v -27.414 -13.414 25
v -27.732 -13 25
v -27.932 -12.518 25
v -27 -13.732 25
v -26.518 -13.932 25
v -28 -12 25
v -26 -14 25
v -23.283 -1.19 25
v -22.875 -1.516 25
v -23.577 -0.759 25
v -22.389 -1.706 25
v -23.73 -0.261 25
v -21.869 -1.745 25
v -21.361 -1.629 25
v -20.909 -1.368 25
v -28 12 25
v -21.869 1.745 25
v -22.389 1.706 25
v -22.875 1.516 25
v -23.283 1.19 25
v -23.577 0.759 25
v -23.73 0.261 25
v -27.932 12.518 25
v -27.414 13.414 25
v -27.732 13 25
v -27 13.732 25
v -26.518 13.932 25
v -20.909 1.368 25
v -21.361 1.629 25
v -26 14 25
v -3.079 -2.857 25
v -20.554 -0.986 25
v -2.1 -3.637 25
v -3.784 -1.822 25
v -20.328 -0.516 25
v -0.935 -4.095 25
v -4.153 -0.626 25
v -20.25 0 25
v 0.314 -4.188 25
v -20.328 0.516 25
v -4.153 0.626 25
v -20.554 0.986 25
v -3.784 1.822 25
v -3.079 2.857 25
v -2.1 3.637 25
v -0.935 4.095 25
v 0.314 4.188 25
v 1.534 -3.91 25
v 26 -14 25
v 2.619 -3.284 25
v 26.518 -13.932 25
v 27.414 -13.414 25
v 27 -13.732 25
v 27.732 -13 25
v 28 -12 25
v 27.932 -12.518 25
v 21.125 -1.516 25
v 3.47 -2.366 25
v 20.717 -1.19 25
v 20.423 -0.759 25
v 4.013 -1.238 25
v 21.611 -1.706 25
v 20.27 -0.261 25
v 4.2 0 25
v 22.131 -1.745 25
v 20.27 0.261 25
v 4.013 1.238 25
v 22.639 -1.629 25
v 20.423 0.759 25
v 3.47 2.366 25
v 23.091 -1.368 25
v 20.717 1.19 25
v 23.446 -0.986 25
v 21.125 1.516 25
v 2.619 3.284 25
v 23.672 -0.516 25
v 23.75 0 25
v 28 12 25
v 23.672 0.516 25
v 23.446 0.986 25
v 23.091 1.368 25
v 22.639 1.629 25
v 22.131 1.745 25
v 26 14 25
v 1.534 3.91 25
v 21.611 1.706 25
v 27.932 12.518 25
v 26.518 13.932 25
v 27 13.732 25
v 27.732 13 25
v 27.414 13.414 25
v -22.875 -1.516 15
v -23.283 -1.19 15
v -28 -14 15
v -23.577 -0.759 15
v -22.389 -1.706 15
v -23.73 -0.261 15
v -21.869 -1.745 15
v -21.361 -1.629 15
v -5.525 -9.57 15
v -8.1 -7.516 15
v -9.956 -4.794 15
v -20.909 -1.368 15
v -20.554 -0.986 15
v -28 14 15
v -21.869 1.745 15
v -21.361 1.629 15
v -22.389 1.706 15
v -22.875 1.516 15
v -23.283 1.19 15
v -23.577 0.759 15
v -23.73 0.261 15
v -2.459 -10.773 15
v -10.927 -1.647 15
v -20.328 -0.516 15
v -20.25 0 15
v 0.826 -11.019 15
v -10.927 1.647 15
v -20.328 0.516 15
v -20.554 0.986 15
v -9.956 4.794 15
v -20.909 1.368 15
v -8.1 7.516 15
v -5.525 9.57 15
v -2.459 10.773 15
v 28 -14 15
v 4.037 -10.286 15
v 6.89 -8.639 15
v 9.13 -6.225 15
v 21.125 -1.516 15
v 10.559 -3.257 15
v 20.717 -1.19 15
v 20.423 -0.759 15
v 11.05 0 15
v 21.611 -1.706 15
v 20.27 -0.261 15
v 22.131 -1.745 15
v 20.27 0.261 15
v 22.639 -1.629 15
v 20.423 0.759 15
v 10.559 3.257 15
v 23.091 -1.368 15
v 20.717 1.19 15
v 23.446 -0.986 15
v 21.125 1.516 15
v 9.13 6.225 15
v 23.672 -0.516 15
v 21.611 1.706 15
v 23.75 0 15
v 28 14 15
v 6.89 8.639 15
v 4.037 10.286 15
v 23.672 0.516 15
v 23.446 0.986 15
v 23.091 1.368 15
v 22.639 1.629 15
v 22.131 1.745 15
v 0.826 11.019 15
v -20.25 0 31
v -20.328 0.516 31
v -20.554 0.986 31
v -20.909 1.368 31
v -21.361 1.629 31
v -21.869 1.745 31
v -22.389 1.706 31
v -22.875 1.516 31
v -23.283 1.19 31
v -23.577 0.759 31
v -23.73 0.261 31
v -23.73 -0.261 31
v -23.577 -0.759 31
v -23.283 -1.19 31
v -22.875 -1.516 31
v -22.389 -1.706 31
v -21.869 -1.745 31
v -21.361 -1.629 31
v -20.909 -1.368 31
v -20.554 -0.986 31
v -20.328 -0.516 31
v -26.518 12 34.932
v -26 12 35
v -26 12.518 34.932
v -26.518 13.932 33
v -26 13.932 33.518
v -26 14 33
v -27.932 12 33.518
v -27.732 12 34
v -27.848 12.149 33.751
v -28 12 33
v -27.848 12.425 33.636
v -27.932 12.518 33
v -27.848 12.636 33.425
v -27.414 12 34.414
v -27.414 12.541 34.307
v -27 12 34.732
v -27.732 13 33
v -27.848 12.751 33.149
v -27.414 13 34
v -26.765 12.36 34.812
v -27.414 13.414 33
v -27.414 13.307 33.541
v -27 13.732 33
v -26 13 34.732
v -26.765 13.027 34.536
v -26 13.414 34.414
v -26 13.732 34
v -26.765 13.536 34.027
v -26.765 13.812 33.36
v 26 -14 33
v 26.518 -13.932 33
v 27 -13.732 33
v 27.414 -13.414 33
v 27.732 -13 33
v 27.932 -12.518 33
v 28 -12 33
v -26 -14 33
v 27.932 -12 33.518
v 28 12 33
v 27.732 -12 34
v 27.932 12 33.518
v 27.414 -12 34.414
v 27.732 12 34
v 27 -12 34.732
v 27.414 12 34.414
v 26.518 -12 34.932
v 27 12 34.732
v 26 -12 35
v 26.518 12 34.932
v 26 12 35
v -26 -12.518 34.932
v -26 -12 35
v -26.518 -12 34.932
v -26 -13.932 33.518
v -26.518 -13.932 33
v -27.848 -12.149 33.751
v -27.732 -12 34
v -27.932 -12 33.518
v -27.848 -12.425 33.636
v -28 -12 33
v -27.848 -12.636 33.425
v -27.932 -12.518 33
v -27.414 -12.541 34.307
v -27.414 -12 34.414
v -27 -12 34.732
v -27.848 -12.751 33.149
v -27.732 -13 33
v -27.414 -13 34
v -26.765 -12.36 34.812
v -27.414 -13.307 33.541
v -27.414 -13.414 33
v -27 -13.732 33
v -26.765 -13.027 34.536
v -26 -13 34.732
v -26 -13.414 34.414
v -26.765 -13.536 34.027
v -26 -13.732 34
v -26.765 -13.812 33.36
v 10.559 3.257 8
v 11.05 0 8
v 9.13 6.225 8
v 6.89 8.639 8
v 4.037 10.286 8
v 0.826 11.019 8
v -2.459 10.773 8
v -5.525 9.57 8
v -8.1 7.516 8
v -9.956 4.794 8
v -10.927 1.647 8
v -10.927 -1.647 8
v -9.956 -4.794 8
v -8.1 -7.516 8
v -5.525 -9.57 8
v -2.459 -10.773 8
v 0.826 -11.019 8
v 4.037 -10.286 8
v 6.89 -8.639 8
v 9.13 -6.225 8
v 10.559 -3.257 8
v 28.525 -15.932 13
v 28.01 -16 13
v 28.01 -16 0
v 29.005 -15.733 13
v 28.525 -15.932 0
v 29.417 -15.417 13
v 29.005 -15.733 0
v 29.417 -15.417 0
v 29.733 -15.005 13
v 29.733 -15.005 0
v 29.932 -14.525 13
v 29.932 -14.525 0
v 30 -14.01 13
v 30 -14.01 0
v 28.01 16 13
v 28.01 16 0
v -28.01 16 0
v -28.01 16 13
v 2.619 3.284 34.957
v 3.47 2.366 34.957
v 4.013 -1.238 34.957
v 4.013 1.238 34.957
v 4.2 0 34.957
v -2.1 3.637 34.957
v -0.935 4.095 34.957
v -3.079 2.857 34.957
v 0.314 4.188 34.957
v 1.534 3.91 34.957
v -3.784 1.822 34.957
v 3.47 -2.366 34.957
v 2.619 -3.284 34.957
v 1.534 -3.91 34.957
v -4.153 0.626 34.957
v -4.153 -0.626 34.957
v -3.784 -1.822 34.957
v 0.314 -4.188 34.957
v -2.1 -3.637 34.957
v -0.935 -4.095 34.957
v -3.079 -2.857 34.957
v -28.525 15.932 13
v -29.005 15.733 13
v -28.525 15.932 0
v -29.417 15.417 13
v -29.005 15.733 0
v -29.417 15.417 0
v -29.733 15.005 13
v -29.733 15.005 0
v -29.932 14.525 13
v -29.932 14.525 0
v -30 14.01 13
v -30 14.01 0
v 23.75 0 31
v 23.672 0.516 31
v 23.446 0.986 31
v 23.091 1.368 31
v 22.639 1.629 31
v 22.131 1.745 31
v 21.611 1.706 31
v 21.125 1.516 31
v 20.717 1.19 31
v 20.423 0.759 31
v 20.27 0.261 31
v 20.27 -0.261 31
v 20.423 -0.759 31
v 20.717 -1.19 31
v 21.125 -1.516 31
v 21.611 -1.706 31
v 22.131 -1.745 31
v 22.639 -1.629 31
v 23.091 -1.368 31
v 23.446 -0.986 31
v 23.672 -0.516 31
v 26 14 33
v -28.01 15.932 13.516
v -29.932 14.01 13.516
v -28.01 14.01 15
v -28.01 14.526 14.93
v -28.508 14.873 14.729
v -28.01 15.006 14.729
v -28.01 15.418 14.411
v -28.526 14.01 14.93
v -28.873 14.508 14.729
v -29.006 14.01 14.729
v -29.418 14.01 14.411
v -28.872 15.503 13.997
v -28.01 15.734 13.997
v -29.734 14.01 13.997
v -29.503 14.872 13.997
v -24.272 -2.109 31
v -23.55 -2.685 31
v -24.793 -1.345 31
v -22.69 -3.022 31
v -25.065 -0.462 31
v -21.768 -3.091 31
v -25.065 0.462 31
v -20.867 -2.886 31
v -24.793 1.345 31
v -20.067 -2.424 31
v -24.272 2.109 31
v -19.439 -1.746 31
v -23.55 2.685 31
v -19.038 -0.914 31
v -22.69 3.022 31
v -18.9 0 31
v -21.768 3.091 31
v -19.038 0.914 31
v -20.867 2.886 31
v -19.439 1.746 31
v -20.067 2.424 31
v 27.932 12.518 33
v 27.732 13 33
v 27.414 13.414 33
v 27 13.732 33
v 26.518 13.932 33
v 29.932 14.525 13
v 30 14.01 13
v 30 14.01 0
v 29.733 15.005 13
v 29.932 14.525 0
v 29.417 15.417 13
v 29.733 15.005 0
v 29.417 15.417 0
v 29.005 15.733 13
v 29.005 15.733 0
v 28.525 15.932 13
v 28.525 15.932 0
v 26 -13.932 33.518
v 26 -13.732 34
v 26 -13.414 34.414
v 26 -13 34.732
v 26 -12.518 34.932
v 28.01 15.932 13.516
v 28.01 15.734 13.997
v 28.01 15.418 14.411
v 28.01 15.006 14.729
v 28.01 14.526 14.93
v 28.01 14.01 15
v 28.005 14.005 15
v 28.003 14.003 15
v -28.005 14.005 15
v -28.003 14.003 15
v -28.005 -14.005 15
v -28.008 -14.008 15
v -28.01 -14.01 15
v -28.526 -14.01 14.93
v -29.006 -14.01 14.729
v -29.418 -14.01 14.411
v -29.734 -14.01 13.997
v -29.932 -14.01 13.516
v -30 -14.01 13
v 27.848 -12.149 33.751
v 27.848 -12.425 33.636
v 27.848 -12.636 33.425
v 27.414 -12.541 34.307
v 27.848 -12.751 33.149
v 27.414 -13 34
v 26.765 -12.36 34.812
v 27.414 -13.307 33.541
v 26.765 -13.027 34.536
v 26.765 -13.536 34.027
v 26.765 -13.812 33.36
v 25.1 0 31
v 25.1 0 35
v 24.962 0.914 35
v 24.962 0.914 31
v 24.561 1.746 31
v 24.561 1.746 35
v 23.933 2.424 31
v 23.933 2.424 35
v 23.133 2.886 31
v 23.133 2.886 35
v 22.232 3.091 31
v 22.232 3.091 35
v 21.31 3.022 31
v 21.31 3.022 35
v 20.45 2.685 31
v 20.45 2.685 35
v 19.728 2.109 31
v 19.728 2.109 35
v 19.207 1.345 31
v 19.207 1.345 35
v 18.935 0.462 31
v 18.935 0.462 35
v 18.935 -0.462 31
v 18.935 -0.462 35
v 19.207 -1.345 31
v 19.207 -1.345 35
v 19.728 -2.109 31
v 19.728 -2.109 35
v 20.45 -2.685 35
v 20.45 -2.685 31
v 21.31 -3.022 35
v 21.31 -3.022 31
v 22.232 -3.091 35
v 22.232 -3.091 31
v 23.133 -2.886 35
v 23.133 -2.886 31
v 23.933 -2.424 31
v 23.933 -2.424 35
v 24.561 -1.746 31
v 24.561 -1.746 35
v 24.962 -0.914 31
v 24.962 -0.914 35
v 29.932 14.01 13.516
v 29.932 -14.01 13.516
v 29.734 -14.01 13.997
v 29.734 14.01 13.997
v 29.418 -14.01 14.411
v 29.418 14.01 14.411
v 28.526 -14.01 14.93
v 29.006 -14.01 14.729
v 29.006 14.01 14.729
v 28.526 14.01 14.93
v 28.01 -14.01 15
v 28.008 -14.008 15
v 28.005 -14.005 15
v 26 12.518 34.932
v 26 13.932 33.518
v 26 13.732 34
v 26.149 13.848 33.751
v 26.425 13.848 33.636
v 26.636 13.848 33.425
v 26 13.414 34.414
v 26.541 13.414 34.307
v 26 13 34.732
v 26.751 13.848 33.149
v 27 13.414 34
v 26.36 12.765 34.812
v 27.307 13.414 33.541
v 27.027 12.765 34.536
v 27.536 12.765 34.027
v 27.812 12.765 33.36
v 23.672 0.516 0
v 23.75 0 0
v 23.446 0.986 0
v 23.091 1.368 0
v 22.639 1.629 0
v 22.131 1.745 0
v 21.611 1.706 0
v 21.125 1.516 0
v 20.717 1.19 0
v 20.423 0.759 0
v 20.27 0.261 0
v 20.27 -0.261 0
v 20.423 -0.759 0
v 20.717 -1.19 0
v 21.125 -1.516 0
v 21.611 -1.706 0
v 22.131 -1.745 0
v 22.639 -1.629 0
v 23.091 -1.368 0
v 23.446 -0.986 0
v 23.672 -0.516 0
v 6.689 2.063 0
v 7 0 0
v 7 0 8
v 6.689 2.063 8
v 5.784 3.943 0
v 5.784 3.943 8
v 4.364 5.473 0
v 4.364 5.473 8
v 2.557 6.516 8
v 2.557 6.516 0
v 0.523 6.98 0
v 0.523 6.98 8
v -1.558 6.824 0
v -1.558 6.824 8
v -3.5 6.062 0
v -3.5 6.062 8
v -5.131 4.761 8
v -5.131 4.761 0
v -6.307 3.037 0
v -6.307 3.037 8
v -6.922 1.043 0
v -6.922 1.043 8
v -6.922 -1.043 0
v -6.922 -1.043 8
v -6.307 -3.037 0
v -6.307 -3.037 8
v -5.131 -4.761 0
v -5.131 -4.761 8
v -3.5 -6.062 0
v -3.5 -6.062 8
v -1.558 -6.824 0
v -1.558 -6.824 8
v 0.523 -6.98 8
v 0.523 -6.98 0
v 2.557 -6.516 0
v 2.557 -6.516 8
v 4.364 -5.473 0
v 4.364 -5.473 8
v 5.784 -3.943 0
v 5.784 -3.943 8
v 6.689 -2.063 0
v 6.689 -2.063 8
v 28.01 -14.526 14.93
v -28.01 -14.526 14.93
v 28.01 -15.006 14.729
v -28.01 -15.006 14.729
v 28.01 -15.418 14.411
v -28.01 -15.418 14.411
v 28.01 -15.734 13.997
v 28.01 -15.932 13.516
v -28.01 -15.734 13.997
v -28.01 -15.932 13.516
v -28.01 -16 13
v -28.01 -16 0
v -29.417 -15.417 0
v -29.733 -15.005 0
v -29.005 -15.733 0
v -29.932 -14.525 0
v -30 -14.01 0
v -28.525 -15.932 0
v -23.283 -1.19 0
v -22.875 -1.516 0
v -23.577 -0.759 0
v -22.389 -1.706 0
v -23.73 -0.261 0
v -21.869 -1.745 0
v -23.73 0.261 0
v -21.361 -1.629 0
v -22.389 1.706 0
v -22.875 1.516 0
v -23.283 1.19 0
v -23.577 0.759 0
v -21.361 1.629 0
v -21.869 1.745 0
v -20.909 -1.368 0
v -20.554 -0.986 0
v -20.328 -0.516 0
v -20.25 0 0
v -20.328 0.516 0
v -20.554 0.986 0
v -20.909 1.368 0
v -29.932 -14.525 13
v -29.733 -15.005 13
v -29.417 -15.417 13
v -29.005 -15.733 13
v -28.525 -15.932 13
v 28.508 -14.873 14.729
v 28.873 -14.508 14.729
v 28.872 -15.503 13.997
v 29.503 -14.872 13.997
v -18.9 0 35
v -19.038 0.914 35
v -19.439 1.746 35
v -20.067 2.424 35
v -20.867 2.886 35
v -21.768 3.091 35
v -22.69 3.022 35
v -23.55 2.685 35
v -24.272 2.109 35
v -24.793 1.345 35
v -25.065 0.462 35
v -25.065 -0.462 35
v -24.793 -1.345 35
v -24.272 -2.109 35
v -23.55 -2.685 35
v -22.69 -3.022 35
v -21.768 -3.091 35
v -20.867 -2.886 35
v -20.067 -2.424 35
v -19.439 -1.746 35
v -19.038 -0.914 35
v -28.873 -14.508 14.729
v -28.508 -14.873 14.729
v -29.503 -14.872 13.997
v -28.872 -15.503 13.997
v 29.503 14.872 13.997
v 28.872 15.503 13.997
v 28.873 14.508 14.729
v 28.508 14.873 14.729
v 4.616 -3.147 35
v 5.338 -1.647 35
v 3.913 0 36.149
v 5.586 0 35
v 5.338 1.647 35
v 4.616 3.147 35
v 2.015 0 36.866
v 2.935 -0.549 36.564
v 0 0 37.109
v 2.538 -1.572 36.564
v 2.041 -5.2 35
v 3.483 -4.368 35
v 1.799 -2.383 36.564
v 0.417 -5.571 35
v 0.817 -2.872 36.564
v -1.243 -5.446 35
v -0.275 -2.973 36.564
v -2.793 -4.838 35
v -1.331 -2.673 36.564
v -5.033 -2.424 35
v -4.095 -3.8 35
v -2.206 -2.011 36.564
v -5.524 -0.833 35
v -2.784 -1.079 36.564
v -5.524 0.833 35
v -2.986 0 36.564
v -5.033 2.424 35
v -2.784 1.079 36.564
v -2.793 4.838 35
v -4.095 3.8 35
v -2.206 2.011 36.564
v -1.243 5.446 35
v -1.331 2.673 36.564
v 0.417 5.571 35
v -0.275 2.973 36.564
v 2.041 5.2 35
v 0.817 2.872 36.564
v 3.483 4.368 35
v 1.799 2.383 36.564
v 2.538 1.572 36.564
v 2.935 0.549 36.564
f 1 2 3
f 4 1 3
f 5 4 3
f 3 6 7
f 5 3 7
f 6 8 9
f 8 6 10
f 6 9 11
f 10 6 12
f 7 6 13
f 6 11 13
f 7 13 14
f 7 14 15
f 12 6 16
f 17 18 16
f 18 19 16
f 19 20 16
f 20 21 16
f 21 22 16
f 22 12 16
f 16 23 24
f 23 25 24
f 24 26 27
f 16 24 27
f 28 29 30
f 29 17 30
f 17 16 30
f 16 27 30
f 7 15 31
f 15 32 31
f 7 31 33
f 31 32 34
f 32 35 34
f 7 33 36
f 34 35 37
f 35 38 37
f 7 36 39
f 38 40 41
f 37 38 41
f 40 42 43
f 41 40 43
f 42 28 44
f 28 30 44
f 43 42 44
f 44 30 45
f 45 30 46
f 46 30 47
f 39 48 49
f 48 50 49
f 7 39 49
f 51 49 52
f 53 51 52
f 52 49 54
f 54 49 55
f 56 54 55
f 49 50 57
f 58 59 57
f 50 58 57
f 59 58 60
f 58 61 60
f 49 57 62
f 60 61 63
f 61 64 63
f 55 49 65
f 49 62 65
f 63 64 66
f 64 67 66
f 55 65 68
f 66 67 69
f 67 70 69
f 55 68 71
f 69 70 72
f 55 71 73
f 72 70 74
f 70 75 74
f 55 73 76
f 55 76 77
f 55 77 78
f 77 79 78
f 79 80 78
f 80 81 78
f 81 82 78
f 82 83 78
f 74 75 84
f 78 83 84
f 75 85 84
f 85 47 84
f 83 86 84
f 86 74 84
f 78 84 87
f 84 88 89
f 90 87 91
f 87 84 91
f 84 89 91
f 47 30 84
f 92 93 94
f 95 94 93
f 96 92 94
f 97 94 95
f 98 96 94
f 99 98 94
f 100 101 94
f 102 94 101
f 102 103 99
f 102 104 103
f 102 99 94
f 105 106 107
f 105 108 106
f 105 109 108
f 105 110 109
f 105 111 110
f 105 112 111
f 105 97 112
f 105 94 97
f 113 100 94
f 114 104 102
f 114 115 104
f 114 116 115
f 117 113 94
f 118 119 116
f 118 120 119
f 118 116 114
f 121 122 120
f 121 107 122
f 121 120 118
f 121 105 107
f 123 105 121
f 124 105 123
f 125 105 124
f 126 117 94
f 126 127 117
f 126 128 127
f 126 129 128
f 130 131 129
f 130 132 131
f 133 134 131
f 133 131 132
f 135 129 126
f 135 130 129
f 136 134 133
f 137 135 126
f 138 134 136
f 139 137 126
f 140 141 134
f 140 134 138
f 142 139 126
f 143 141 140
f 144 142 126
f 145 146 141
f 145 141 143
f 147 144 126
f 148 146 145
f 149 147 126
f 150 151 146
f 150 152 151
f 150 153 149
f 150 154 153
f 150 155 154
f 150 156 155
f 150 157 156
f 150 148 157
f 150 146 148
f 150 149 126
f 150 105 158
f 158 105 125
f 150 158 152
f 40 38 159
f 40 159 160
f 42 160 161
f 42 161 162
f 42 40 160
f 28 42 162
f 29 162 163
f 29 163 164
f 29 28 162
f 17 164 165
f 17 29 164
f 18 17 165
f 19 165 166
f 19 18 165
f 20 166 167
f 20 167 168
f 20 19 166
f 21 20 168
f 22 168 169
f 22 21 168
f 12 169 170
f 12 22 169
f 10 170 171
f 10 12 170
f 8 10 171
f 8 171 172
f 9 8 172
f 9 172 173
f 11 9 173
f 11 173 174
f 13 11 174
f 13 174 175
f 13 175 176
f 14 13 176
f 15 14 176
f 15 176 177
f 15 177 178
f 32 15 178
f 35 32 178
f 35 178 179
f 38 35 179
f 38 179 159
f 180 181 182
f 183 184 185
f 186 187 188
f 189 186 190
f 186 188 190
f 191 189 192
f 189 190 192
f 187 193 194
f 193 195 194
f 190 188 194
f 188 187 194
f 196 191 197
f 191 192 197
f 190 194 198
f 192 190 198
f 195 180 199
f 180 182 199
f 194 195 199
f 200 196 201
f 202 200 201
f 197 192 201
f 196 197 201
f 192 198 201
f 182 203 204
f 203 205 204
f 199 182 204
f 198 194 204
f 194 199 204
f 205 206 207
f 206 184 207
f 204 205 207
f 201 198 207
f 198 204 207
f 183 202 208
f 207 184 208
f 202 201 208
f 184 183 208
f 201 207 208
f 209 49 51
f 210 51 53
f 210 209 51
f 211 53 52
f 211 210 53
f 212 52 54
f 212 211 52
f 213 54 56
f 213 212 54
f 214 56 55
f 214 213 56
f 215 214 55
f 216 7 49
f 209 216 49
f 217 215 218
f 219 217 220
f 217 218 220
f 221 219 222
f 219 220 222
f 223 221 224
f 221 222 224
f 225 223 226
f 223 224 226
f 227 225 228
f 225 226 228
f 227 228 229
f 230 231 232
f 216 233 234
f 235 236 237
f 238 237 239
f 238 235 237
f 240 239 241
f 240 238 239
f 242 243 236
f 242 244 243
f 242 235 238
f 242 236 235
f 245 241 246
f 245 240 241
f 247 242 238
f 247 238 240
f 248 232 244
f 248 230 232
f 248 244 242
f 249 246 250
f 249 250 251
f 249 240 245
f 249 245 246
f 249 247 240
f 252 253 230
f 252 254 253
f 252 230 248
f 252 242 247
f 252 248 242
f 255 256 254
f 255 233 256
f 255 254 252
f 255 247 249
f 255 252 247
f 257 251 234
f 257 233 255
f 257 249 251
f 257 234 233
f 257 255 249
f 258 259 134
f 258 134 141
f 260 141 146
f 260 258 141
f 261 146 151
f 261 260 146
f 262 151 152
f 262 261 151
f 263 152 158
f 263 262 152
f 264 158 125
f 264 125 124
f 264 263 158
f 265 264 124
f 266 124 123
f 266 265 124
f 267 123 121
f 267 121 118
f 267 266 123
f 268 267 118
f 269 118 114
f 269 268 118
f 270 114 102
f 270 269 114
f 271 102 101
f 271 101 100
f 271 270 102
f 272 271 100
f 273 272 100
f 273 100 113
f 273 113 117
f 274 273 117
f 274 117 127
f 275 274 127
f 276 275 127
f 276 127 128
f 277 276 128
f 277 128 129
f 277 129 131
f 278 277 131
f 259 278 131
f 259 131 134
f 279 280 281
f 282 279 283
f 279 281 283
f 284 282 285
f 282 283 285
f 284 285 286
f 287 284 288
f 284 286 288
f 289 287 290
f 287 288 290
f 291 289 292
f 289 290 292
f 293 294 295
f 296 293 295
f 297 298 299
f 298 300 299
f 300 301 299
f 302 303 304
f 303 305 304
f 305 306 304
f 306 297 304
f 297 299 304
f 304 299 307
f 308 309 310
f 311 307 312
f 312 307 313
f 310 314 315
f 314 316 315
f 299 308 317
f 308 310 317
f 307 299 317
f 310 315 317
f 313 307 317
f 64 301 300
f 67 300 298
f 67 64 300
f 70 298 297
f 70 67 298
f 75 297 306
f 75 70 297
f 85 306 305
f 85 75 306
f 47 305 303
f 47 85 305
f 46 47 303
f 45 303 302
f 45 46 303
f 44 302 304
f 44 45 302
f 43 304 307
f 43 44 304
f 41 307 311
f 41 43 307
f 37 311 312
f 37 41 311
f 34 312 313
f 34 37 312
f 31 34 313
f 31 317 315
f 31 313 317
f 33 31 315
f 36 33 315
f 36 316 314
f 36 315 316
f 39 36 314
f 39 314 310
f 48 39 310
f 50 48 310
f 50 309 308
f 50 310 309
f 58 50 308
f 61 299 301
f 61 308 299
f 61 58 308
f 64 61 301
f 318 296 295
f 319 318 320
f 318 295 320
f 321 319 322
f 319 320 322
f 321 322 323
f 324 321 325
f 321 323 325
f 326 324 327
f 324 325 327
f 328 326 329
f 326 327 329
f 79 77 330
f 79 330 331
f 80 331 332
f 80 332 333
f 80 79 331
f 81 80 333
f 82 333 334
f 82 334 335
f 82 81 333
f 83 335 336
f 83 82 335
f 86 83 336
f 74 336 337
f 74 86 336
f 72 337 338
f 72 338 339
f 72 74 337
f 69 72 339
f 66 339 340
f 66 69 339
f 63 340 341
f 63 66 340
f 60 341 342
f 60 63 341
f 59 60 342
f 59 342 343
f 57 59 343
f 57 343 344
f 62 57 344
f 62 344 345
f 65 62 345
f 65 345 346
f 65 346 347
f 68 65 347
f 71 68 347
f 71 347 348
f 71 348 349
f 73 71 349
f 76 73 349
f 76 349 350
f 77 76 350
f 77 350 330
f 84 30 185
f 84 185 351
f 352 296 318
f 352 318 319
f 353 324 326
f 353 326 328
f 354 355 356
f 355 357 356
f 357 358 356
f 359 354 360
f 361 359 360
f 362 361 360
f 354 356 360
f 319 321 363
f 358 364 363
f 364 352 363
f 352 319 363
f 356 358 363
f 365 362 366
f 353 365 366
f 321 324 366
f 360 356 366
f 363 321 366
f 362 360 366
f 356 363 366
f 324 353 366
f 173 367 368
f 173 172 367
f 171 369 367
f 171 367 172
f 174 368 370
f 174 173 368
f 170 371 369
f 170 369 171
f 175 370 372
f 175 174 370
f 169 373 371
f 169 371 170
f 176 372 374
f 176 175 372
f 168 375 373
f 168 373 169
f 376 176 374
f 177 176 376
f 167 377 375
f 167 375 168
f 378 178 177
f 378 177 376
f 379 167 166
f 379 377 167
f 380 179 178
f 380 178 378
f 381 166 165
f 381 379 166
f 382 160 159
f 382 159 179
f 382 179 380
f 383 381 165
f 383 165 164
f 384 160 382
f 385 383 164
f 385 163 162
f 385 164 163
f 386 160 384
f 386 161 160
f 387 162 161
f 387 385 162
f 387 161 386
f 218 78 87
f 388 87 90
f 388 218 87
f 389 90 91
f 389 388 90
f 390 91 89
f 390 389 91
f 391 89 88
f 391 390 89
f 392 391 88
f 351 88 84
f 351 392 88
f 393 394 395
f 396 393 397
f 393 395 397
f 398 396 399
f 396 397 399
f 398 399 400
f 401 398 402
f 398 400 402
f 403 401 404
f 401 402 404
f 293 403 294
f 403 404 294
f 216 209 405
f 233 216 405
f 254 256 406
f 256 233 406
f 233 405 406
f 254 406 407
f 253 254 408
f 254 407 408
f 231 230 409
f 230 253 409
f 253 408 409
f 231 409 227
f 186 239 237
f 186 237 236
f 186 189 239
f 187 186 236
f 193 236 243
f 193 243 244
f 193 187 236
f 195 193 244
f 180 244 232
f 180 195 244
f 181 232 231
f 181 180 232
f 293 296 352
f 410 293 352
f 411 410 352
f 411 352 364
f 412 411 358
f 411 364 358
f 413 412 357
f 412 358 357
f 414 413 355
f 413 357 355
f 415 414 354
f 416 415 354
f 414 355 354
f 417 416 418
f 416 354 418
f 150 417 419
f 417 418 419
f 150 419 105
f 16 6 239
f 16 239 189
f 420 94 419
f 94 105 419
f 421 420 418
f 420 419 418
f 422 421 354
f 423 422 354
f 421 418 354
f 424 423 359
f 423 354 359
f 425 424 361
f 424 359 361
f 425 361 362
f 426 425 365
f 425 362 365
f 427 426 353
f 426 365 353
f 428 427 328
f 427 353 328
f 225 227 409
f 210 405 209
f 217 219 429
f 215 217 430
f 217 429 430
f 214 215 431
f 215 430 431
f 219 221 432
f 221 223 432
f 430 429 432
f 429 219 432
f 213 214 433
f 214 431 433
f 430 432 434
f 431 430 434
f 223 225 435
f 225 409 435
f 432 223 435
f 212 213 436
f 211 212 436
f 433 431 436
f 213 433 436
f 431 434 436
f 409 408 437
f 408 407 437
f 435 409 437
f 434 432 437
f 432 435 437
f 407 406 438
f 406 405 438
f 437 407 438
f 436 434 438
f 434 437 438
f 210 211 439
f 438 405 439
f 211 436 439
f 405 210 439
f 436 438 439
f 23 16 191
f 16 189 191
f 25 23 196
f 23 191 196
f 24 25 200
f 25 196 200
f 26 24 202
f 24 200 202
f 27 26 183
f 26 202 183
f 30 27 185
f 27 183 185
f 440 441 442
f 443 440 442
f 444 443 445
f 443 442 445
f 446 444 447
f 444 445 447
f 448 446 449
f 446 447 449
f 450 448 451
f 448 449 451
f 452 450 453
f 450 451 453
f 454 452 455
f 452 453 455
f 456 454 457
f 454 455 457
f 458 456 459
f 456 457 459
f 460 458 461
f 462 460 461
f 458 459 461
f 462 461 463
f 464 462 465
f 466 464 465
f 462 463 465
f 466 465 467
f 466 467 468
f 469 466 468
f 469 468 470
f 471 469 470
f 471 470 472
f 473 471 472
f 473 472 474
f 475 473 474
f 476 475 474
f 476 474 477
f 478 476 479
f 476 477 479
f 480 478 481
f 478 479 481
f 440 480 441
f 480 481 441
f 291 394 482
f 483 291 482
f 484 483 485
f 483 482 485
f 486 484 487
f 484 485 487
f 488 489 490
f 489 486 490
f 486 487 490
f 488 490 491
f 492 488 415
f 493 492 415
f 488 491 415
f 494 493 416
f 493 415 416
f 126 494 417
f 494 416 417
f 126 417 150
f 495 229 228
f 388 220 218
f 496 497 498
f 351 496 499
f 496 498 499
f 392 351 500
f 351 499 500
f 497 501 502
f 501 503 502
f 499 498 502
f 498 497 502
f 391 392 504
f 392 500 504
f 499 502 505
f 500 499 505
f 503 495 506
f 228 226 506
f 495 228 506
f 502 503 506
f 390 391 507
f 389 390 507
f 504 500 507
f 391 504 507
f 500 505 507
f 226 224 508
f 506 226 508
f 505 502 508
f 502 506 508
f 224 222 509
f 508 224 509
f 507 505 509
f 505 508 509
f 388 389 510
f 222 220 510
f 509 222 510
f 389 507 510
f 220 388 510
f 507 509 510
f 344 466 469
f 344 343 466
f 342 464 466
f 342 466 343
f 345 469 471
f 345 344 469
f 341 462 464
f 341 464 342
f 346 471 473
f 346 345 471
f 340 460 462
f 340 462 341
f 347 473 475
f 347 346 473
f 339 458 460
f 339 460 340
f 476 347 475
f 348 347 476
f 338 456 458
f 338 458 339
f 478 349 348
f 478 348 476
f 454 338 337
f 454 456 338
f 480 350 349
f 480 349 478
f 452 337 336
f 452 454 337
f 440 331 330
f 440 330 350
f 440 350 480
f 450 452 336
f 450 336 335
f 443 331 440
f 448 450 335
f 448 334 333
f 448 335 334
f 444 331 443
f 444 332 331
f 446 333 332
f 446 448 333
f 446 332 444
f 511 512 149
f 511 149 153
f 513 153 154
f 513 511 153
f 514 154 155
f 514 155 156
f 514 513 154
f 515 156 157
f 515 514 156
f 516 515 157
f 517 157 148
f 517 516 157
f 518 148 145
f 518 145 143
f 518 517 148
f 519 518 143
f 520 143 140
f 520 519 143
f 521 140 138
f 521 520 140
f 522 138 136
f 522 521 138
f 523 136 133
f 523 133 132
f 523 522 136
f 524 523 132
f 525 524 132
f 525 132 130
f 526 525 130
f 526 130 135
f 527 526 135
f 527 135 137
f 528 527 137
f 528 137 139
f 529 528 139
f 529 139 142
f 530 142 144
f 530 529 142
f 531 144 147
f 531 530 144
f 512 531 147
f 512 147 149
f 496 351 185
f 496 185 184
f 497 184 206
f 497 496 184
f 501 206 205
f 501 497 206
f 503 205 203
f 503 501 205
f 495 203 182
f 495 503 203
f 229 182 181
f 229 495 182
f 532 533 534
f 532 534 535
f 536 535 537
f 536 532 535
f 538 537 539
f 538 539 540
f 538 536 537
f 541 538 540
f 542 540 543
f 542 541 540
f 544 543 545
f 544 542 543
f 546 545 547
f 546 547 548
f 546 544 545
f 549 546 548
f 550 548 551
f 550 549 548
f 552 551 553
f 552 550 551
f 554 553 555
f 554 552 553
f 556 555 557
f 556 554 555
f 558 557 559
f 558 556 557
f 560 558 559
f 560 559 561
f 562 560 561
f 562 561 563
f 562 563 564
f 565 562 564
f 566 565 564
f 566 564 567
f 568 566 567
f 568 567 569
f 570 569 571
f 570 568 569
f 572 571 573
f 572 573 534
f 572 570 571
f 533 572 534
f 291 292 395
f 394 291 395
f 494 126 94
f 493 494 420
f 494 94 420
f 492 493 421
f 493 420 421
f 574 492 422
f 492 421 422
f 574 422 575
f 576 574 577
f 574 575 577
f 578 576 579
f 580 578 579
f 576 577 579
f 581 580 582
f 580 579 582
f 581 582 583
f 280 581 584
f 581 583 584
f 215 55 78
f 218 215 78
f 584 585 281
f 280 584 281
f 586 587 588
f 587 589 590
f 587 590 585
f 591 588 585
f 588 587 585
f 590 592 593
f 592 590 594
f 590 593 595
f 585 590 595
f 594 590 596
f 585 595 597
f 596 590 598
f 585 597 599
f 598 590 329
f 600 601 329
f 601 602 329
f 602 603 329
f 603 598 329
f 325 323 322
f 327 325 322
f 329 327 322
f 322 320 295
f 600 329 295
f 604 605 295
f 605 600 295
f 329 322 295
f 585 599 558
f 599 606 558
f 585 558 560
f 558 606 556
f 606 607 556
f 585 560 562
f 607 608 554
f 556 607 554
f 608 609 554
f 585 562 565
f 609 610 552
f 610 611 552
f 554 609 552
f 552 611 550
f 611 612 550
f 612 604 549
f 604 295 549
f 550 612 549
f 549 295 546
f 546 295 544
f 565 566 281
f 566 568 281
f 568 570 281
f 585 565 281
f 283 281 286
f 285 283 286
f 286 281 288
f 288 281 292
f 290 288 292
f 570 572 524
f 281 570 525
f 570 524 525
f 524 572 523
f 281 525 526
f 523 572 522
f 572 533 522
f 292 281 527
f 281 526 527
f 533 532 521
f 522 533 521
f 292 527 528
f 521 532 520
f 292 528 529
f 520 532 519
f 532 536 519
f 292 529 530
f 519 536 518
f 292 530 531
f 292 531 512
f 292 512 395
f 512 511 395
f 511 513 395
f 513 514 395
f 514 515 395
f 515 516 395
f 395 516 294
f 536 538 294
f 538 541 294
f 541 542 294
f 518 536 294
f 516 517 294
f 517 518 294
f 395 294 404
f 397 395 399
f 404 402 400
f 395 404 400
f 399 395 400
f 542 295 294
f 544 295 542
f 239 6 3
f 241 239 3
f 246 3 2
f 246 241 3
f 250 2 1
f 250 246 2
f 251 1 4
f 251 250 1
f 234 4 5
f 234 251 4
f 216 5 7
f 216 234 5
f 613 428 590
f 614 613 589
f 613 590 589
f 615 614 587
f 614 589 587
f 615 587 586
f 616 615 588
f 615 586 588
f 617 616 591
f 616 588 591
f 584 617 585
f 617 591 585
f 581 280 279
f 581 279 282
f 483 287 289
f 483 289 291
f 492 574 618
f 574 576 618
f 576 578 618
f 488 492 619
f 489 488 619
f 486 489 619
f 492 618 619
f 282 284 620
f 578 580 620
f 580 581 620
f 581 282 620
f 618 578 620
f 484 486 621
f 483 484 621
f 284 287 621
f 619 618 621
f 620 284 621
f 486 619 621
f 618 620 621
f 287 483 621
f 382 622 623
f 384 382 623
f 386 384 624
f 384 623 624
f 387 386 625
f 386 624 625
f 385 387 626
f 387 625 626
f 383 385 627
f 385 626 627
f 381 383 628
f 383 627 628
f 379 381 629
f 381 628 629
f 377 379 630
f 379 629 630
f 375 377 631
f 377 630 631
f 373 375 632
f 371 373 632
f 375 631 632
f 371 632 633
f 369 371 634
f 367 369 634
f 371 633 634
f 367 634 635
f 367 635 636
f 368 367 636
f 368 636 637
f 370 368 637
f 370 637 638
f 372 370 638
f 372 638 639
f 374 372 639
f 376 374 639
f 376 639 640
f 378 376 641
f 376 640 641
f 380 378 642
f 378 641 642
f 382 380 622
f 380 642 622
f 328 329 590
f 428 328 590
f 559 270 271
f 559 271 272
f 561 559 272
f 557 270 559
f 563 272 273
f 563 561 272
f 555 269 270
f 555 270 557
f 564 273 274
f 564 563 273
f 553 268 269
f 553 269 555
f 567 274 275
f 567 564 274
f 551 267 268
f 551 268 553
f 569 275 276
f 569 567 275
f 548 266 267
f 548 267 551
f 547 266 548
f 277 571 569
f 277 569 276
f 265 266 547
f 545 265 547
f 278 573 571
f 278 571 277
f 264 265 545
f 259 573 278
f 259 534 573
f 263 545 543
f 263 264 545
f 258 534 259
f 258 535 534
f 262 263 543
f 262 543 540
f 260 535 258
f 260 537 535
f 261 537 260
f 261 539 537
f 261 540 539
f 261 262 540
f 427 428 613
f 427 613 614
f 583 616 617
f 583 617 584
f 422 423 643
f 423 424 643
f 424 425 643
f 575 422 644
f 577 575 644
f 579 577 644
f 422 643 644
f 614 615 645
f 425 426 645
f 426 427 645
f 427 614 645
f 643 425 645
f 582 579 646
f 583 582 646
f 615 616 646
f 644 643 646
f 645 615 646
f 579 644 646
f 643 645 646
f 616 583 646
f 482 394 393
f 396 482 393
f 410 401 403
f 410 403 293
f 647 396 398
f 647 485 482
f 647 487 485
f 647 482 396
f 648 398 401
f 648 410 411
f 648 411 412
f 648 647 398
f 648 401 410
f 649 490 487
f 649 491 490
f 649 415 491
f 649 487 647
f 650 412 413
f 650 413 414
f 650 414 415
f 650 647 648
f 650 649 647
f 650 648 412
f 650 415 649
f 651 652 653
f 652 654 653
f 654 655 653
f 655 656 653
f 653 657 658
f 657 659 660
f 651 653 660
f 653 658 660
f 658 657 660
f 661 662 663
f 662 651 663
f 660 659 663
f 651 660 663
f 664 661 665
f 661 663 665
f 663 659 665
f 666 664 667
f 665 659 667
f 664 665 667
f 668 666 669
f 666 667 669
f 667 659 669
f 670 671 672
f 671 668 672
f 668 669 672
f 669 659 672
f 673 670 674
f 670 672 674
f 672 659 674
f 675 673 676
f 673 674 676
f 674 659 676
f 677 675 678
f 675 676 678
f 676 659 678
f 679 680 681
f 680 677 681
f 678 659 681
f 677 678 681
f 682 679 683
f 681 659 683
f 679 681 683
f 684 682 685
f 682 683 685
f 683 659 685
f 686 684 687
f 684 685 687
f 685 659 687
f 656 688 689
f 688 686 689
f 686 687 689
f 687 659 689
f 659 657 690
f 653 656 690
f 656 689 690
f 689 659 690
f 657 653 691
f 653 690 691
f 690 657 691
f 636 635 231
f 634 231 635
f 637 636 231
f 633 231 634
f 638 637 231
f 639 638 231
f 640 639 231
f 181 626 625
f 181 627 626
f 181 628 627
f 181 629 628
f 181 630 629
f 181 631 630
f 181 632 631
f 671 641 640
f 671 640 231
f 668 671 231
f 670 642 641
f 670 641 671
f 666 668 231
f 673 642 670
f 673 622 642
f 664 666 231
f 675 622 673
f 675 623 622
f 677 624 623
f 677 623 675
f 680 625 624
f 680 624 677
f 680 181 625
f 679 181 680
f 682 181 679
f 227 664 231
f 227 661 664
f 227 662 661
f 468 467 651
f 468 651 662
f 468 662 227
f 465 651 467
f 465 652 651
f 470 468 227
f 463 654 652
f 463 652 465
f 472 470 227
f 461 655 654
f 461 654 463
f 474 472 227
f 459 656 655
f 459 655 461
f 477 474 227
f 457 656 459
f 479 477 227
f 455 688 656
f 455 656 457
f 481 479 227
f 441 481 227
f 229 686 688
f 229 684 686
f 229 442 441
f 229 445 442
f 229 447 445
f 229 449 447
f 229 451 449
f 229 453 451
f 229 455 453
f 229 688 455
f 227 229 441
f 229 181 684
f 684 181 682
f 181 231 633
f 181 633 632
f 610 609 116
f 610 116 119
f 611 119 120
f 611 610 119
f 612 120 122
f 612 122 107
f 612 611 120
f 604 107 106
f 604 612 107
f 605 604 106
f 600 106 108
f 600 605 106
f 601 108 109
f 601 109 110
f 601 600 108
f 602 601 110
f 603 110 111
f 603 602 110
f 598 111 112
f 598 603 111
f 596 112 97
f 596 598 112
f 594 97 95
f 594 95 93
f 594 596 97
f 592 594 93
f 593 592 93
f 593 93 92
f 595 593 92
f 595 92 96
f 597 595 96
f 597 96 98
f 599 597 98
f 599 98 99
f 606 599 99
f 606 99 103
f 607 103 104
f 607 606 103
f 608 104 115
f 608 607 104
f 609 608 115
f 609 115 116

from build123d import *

# Parameters (mm, degrees)
F0_R         = 1.75
F0_R_2       = 11.05
F1_DEPTH     = 15
F0_R_3       = 7
F2_DEPTH     = 8
F4_W         = 56
F4_H         = 28
F4_R         = 1.75
F4_R_2       = 4.2
F5_DEPTH     = 10
F6_R         = 2
F7_DEPTH     = 10
F8_T1_DEPTH  = 66.0206933322
F8_T3_DEPTH  = 38.0206933322
F8_T6_ANGLE  = 90
F8_T8_ANGLE  = 90
F8_T10_ANGLE = 90
F8_T12_ANGLE = 90
F9_R         = 3.1
F9_R_2       = 1.75
F10_DEPTH    = 4


# Not quite as in the source:
# - a fillet or chamfer that OpenCascade refuses, or shapes differently, is made with other operations: its cross-section is extruded or revolved along the edge and cut away or added
# - a feature names something its author has since deleted; it is built from what else it names


with BuildPart() as f1:
    # F0 (on Top) → F1 (new body)
    with BuildSketch(Plane.XY):
        with BuildLine():
            Line((28.0103466661, 16), (-28.0103466661, 16))
            ThreePointArc((-28.0103466661, 16), (-29.4172440307, 15.4172440307), (-30, 14.0103466661))
            Line((-30, 14.0103466661), (-30, -14.0103466661))
            ThreePointArc((-30, -14.0103466661), (-29.4172440307, -15.4172440307), (-28.0103466661, -16))
            Line((-28.0103466661, -16), (28.0103466661, -16))
            ThreePointArc((28.0103466661, -16), (29.4172440307, -15.4172440307), (30, -14.0103466661))
            Line((30, -14.0103466661), (30, 14.0103466661))
            ThreePointArc((30, 14.0103466661), (29.4172440307, 15.4172440307), (28.0103466661, 16))
        make_face()
        with Locations((-22, 0)):
            Circle(F0_R, mode=Mode.SUBTRACT)
        Circle(F0_R_2, mode=Mode.SUBTRACT)
        with Locations((22, 0)):
            Circle(F0_R, mode=Mode.SUBTRACT)
    extrude(amount=F1_DEPTH)

    # F0 (on Top) → F2 (join)
    with BuildSketch(Plane.XY):
        Circle(F0_R_2)
        Circle(F0_R_3, mode=Mode.SUBTRACT)
    extrude(amount=F2_DEPTH)

    # F8: fillet of radius 2 on 8 edges, made by hand

    # F8_s2 → F8_t1 (cut)
    with BuildSketch(Plane.YZ.offset(-33.0103466661)):
        with BuildLine():
            ThreePointArc((-14, 15), (-15.4142135624, 14.4142135624), (-16, 13))
            Line((-16, 13), (-16, 15))
            Line((-16, 15), (-14, 15))
        make_face()
        with BuildLine():
            ThreePointArc((16, 13), (15.4142135624, 14.4142135624), (14, 15))
            Line((14, 15), (16, 15))
            Line((16, 15), (16, 13))
        make_face()
    extrude(amount=F8_T1_DEPTH, mode=Mode.SUBTRACT)

    # F8_s4 → F8_t3 (cut)
    with BuildSketch(Plane.XZ.offset(-19.0103466661)):
        with BuildLine():
            ThreePointArc((30, 13), (29.4142135624, 14.4142135624), (28, 15))
            Line((28, 15), (30, 15))
            Line((30, 15), (30, 13))
        make_face()
        with BuildLine():
            ThreePointArc((-28, 15), (-29.4142135624, 14.4142135624), (-30, 13))
            Line((-30, 13), (-30, 15))
            Line((-30, 15), (-28, 15))
        make_face()
    extrude(amount=F8_T3_DEPTH, mode=Mode.SUBTRACT)

    # F8_s5 → F8_t6 (revolve, cut)
    with BuildSketch(Plane.XZ.offset(-14.0103466661)):
        with BuildLine():
            ThreePointArc((30, 13), (29.4178669423, 14.4105507201), (28.0103466661, 14.9999732364))
            Line((28.0103466661, 14.9999732364), (28.0103466661, 15))
            Line((28.0103466661, 15), (30, 15))
            Line((30, 15), (30, 13))
        make_face()
    revolve(axis=Axis((28.0103466661, 14.0103466661, 15), (0, 0, 1)), revolution_arc=F8_T6_ANGLE, mode=Mode.SUBTRACT)

    # F8_s7 → F8_t8 (revolve, cut)
    with BuildSketch(Plane.YZ.offset(-28.0103466661)):
        with BuildLine():
            ThreePointArc((14.0103466661, 14.9999732364), (15.4178669423, 14.4105507201), (16, 13))
            Line((16, 13), (16, 15))
            Line((16, 15), (14.0103466661, 15))
            Line((14.0103466661, 15), (14.0103466661, 14.9999732364))
        make_face()
    revolve(axis=Axis((-28.0103466661, 14.0103466661, 15), (0, 0, 1)), revolution_arc=F8_T8_ANGLE, mode=Mode.SUBTRACT)

    # F8_s9 → F8_t10 (revolve, cut)
    with BuildSketch(Plane.XZ.offset(14.0103466661)):
        with BuildLine():
            ThreePointArc((-28.0103466661, 14.9999732364), (-29.4178669423, 14.4105507201), (-30, 13))
            Line((-30, 13), (-30, 15))
            Line((-30, 15), (-28.0103466661, 15))
            Line((-28.0103466661, 15), (-28.0103466661, 14.9999732364))
        make_face()
    revolve(axis=Axis((-28.0103466661, -14.0103466661, 15), (0, 0, 1)), revolution_arc=F8_T10_ANGLE, mode=Mode.SUBTRACT)

    # F8_s11 → F8_t12 (revolve, cut)
    with BuildSketch(Plane.YZ.offset(28.0103466661)):
        with BuildLine():
            ThreePointArc((-14.0103466661, 14.9999732364), (-15.4178669423, 14.4105507201), (-16, 13))
            Line((-16, 13), (-16, 15))
            Line((-16, 15), (-14.0103466661, 15))
            Line((-14.0103466661, 15), (-14.0103466661, 14.9999732364))
        make_face()
    revolve(axis=Axis((28.0103466661, -14.0103466661, 15), (0, 0, 1)), revolution_arc=F8_T12_ANGLE, mode=Mode.SUBTRACT)


with BuildPart() as f5:
    # F4 (on offset) → F5 (new body)
    with BuildSketch(Plane.XY.offset(25)):
        Rectangle(F4_W, F4_H)
        with Locations((-22, 0)):
            Circle(F4_R, mode=Mode.SUBTRACT)
        Circle(F4_R_2, mode=Mode.SUBTRACT)
        with Locations((22, 0)):
            Circle(F4_R, mode=Mode.SUBTRACT)
        Circle(F4_R_2)
    extrude(amount=F5_DEPTH)

    # F6
    f6_edges = [f5.edges().sort_by_distance(p)[0] for p in [
        (0, -14, 35),
        (28, 0, 35),
        (0, 14, 35),
        (-28, 0, 35),
        (-28, -14, 30),
        (-28, 14, 30),
        (28, -14, 30),
        (28, 14, 30),
    ]]
    fillet(f6_edges, radius=F6_R)

    # F4 (on offset) → F7 (cut)
    with BuildSketch(Plane.XY.offset(25)):
        Circle(F4_R_2)
    extrude(amount=F7_DEPTH, mode=Mode.SUBTRACT)

    # F9 (on face) → F10 (cut)
    with BuildSketch(Plane.XY.offset(35)):
        with Locations((-22, 0)):
            Circle(F9_R)
        with Locations((-22, 0)):
            Circle(F9_R_2, mode=Mode.SUBTRACT)
        with Locations((22, 0)):
            Circle(F9_R)
        with Locations((22, 0)):
            Circle(F9_R_2, mode=Mode.SUBTRACT)
    extrude(amount=-F10_DEPTH, mode=Mode.SUBTRACT)

    # F11 (on Front) → F12 (revolve)
    with BuildSketch(Plane.XZ):
        with BuildLine():
            Line((0, 34.9572327588), (5.6344886552, 34.9572327588))
            ThreePointArc((5.6344886552, 34.9572327588), (3.0157444319, 36.5529745163), (0, 37.1093004872))
            Line((0, 37.1093004872), (0, 34.9572327588))
        make_face()
    revolve(axis=Axis((0, 0, 36.033266623), (0, 0, -1)))


solid = Compound([f1.part, f5.part])
